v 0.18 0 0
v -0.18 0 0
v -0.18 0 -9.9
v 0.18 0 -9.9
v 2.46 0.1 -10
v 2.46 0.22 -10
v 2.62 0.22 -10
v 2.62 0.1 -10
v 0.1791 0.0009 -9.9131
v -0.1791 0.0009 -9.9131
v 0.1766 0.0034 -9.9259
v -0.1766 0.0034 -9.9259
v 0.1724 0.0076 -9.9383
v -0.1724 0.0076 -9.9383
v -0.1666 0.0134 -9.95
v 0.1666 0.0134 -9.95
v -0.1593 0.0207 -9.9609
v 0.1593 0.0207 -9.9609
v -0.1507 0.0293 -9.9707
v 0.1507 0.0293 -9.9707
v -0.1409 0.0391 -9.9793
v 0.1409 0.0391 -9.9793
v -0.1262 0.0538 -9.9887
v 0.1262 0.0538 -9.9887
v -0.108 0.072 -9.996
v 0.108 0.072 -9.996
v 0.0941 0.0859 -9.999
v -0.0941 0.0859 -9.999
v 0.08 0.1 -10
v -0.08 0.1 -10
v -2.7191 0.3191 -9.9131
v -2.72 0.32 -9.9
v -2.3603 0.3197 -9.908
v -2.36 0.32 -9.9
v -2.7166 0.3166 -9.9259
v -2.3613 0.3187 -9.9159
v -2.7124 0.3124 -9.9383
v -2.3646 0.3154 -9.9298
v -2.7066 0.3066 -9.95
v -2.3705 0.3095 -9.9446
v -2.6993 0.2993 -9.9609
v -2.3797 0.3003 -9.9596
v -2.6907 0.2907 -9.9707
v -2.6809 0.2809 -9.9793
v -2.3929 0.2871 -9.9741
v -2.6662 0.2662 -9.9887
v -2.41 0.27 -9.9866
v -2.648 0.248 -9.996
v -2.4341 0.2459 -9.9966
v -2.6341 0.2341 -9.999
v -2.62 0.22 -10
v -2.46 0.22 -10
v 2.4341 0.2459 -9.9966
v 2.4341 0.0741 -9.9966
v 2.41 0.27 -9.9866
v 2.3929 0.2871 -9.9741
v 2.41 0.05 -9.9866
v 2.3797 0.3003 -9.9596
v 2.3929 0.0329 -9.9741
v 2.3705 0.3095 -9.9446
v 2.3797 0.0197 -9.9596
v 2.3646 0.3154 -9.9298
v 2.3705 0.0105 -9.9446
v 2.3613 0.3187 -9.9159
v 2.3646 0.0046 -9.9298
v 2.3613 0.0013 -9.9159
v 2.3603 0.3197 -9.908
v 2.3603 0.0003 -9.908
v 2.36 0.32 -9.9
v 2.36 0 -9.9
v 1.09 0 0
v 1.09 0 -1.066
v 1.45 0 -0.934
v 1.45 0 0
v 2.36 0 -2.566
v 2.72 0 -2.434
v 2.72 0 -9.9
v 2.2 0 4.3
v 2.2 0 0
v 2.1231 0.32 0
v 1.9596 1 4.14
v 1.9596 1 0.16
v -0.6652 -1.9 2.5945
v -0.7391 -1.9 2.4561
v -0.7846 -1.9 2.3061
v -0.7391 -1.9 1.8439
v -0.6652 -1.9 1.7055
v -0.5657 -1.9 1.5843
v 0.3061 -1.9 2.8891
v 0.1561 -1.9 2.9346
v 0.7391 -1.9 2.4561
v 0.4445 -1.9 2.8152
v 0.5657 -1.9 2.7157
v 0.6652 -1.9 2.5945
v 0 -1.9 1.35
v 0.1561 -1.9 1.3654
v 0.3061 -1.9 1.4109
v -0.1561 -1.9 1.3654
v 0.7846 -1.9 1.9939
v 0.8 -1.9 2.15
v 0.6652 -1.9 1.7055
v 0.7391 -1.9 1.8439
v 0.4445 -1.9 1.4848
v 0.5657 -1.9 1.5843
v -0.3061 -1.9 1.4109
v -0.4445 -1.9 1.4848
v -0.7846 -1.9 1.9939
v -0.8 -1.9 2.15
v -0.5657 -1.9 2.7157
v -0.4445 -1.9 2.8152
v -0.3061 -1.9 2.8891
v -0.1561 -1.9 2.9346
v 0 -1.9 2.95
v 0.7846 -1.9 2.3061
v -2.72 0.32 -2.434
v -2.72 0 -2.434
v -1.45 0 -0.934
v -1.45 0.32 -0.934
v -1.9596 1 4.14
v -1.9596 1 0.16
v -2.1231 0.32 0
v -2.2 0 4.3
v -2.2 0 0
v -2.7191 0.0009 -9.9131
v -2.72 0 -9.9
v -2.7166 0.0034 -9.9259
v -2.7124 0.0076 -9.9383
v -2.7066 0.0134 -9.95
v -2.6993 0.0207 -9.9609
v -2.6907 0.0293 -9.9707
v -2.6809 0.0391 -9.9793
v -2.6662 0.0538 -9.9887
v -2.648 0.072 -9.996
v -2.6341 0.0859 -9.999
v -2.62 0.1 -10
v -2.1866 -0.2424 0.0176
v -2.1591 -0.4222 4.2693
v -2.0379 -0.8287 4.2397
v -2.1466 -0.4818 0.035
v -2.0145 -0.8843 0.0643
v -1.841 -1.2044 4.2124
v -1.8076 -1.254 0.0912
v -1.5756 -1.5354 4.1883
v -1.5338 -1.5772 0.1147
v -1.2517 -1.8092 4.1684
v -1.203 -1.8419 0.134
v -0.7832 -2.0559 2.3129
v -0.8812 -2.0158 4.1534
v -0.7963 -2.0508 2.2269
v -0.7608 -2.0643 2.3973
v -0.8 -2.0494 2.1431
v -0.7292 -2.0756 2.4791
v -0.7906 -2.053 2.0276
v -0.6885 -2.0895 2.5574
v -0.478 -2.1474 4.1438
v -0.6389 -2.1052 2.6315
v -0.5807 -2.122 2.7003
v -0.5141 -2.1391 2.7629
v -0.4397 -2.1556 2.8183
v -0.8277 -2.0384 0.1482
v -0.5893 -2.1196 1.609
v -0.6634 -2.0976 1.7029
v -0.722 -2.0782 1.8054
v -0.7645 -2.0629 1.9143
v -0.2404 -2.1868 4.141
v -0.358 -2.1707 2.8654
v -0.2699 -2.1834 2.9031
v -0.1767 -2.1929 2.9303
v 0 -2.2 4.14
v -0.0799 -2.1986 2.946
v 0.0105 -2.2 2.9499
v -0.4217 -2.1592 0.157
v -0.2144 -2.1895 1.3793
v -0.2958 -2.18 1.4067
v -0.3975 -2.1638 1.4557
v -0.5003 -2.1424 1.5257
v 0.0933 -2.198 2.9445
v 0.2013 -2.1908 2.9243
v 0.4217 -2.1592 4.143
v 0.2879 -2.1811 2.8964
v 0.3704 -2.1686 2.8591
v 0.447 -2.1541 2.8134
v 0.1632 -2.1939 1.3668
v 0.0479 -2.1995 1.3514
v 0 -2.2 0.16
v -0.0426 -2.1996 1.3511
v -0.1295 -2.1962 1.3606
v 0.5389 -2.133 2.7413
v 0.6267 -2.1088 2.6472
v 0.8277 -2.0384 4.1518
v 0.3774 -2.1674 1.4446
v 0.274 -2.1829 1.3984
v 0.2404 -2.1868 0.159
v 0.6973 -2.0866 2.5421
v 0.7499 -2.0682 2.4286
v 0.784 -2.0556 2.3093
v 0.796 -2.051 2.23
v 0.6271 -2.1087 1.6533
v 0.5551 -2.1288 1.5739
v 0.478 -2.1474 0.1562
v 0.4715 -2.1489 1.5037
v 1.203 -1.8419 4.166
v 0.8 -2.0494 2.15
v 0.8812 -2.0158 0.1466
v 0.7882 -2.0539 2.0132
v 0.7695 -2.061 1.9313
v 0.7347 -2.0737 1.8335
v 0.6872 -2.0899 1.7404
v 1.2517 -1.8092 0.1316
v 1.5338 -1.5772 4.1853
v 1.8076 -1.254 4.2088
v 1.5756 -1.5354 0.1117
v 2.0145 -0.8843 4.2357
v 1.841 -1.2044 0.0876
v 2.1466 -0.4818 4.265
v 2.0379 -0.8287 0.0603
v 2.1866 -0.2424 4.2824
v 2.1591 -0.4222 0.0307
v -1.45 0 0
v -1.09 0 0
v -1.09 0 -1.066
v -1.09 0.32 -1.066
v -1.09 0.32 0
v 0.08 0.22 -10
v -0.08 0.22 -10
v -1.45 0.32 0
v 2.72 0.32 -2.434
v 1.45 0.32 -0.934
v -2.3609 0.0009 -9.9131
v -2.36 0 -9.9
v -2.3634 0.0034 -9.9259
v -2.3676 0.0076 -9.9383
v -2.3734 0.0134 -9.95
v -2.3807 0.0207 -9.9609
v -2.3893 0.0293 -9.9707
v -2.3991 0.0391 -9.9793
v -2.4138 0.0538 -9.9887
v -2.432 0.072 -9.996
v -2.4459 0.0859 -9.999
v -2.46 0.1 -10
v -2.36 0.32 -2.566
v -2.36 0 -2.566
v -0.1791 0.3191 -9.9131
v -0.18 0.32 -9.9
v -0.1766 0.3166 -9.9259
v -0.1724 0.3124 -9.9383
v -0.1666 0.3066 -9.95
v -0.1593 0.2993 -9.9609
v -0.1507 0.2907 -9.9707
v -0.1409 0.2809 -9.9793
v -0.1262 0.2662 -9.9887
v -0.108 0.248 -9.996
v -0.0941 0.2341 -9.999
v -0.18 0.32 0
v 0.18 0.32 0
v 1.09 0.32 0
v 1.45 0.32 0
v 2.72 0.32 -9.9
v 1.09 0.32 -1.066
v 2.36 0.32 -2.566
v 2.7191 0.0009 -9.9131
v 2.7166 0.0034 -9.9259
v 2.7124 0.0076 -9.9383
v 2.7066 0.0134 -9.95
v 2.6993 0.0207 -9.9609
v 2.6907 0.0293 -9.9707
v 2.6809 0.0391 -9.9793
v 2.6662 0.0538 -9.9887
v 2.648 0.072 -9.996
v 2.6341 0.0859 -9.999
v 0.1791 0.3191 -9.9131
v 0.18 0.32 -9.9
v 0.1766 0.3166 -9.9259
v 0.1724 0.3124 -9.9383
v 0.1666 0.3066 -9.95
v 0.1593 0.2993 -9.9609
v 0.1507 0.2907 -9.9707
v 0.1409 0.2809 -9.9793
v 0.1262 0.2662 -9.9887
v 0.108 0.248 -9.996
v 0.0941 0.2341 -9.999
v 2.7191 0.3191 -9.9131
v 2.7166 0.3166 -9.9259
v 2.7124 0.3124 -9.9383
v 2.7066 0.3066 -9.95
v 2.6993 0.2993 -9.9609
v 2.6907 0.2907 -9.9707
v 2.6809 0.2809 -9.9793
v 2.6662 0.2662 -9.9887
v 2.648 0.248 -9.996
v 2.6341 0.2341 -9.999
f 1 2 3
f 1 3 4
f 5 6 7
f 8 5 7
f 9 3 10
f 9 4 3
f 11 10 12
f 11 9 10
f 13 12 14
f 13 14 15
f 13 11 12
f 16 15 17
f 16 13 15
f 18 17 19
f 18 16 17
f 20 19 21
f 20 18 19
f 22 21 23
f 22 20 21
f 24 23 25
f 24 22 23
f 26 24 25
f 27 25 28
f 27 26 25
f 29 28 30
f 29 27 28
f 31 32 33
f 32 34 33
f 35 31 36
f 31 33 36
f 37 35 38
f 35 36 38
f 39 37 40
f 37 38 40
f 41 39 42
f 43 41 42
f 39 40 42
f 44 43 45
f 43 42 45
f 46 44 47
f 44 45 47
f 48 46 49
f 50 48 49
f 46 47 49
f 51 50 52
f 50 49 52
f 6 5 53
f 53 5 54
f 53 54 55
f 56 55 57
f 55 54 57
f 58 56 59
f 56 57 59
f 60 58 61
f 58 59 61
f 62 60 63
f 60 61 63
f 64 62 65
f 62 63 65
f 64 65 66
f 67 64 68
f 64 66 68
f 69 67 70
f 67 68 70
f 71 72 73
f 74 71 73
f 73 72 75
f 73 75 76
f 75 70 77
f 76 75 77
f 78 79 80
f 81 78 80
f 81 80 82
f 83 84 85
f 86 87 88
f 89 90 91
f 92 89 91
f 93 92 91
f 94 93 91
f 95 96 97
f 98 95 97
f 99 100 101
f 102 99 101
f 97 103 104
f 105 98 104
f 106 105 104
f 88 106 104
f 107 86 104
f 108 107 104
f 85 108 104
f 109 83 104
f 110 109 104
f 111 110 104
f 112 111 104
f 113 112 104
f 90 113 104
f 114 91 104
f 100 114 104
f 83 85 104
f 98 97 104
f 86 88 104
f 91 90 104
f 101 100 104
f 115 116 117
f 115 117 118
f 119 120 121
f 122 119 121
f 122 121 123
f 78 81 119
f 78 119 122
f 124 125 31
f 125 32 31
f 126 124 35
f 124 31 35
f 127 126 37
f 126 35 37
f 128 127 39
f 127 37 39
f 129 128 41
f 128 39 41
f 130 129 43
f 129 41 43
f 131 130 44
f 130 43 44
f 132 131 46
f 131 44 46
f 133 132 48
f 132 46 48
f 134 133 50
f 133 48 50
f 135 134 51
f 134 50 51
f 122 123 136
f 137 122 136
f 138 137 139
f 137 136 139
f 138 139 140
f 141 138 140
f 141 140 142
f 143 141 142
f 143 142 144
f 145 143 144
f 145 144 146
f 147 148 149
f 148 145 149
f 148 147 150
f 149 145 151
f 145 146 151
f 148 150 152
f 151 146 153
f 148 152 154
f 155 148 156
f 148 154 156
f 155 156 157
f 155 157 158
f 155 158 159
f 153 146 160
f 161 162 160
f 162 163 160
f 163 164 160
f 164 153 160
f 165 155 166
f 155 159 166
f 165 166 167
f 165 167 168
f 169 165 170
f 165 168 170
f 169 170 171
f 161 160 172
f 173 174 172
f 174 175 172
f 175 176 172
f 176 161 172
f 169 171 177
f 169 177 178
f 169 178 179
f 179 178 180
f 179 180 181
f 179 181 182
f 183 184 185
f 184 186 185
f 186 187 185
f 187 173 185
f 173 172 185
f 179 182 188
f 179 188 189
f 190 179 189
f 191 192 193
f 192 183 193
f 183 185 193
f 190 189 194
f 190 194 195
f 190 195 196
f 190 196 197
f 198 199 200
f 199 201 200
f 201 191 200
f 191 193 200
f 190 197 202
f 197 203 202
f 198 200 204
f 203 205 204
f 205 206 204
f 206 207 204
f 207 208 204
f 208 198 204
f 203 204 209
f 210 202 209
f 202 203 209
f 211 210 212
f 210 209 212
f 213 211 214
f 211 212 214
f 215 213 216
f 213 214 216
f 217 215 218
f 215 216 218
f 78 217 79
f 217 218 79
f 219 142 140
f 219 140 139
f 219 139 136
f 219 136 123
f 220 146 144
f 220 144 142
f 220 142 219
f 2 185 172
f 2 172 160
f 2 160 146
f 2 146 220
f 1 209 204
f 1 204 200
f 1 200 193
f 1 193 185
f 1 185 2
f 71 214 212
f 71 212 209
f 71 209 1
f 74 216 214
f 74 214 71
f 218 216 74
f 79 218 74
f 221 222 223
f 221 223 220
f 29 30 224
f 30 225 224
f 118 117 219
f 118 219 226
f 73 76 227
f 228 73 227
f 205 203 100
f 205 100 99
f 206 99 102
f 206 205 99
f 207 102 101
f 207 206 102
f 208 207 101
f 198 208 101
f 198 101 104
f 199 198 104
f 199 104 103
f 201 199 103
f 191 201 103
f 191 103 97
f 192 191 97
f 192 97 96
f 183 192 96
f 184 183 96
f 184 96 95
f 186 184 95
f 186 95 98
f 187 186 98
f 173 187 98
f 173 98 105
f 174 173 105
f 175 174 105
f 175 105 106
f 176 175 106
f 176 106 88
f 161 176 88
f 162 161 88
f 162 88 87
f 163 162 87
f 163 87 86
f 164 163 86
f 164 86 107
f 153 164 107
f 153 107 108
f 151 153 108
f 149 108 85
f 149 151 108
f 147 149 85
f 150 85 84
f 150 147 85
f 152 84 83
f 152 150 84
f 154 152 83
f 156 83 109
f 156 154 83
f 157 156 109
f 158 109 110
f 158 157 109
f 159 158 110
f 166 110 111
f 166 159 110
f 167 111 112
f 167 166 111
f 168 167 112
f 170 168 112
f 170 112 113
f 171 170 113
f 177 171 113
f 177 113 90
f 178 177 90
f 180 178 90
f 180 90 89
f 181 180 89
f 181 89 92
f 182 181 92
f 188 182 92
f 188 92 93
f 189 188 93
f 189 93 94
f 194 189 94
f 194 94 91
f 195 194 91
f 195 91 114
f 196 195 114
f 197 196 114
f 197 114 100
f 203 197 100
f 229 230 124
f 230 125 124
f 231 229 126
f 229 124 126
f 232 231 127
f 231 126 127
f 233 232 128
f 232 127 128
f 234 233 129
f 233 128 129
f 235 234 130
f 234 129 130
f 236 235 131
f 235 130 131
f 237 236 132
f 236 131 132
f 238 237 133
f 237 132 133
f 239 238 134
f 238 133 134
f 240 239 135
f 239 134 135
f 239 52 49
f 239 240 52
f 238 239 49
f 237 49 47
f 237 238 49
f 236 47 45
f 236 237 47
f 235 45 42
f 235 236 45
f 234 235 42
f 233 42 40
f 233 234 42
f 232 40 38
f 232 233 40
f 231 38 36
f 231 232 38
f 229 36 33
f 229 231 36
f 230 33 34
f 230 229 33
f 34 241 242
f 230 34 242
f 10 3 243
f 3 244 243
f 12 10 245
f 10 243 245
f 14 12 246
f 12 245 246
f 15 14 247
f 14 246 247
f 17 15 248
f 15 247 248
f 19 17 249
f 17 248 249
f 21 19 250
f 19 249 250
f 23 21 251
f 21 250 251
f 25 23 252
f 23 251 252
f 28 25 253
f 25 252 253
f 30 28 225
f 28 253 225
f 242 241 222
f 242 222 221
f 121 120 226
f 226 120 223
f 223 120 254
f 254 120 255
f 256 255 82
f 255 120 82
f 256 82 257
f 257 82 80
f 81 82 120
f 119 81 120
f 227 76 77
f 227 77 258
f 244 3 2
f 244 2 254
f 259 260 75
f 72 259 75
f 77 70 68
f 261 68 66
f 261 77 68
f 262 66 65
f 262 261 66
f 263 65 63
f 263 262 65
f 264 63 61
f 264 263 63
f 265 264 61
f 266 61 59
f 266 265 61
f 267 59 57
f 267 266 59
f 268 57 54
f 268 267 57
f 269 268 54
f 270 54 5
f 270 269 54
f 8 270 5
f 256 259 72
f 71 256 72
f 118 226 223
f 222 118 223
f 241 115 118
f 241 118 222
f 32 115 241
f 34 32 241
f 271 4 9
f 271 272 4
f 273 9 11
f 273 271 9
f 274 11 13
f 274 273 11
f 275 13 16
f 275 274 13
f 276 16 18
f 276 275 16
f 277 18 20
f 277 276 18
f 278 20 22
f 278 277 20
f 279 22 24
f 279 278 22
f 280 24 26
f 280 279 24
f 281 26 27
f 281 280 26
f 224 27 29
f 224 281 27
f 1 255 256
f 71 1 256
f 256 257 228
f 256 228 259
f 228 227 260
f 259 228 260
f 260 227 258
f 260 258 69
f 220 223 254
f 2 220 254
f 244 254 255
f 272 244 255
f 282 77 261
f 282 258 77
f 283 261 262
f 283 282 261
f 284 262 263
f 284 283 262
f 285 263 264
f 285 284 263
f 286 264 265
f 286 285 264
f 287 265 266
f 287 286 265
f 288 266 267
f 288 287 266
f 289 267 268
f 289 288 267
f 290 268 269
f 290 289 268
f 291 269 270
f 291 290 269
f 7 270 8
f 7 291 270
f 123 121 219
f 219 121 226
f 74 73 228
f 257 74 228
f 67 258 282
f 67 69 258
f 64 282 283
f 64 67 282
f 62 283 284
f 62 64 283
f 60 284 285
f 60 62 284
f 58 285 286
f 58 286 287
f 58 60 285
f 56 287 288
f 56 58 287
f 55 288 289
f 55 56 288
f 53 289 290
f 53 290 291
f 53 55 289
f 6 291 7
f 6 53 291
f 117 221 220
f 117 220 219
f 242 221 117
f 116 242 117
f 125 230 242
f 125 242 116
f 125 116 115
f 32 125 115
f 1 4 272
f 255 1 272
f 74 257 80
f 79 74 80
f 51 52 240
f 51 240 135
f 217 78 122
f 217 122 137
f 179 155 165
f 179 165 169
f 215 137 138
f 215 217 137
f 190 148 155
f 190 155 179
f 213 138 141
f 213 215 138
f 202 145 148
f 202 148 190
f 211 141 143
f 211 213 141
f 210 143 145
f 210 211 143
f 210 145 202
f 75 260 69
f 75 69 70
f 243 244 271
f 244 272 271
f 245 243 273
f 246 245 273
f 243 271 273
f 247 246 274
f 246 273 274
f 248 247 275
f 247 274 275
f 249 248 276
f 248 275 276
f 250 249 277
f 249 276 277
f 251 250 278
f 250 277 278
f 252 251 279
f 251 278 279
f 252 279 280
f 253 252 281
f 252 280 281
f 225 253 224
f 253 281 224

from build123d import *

# Parameters (mm, degrees)
BOSS_EXTRUDE1_DEPTH = 4.3
SKETCH2_W           = 0.36
SKETCH2_H           = 0.32
SKETCH2_4_W         = 0.36
SKETCH2_4_H         = 0.32
BOSS_EXTRUDE2_DEPTH = 10
FILLET1_R           = 0.1
SKETCH4_R           = 0.8
CUT_EXTRUDE1_DEPTH  = 0.25
CUT_EXTRUDE2_DEPTH  = 5
CUT_EXTRUDE3_DEPTH  = 5
CUT_EXTRUDE4_DEPTH  = 5
CUT_EXTRUDE6_DEPTH  = 5
SKETCH4_3_R         = 0.8
CUT_EXTRUDE8_DEPTH  = 0.3


with BuildPart() as part:
    # Sketch1 → Boss-Extrude1 (new body)
    with BuildSketch(Plane.XY):
        with BuildLine():
            Line((-1.959591794, 1), (-2.2, 0))
            ThreePointArc((-2.2, 0), (0, -2.2), (2.2, 0))
            Line((2.2, 0), (1.959591794, 1))
            Line((1.959591794, 1), (-1.959591794, 1))
        make_face()
    extrude(amount=BOSS_EXTRUDE1_DEPTH)

    # Sweep1: sweep along a curve in space
    with BuildLine() as sweep1_path:
        Line((1.27, 0.16, 0), (1.27, 0.16, -1))
        Line((1.27, 0.16, -1), (2.54, 0.16, -2.5))
        Line((2.54, 0.16, -10), (2.54, 0.16, -2.5))
    # Sketch2 → Sweep1 (sweep)
    with BuildSketch(Plane.XY):
        with Locations((1.27, 0.16)):
            Rectangle(SKETCH2_W, SKETCH2_H)
    sweep1 = sweep(path=sweep1_path.line, transition=Transition.RIGHT)

    # Mirror1: Sweep1 across plane
    add(sweep1.mirror(Plane(origin=(0, 0, 0), x_dir=(0, 0, 1), z_dir=(1, 0, 0))))

    # Sketch2<4> → Boss-Extrude2 (add)
    with BuildSketch(Plane.XY):
        with Locations((0, 0.16)):
            Rectangle(SKETCH2_4_W, SKETCH2_4_H)
    extrude(amount=-BOSS_EXTRUDE2_DEPTH)

    # Fillet1
    fillet1_edges = [part.edges().sort_by_distance(p)[0] for p in [
        (-2.54, 0.32, -10),
        (-2.72, 0.16, -10),
        (-2.54, 0, -10),
        (-2.36, 0.16, -10),
        (0, 0.32, -10),
        (-0.18, 0.16, -10),
        (0, 0, -10),
        (0.18, 0.16, -10),
        (2.36, 0.16, -10),
        (2.54, 0.32, -10),
        (2.72, 0.16, -10),
        (2.54, 0, -10),
    ]]
    fillet(fillet1_edges, radius=FILLET1_R)

    # Sketch4 → Cut-Extrude1 (cut)
    with BuildSketch(Plane(origin=(0, -2.2, 0), x_dir=(1, 0, 0), z_dir=(0, 1, 0))):
        with Locations((0, -2.15)):
            Circle(SKETCH4_R)
    extrude(amount=CUT_EXTRUDE1_DEPTH, mode=Mode.SUBTRACT)

    # Sketch5 → Cut-Extrude2 (cut)
    with BuildSketch(Plane(origin=(2.2, 0, 0), x_dir=(0, 0, -1), z_dir=(1, 0, 0))):
        Polygon((-4.3, 1), (-4.3, 0), (-4.14, 1), align=None)
    extrude(amount=-CUT_EXTRUDE2_DEPTH, mode=Mode.SUBTRACT)

    # Sketch6 → Cut-Extrude3 (cut)
    with BuildSketch(Plane(origin=(2.2, 0, 0), x_dir=(0, 0, -1), z_dir=(1, 0, 0))):
        Polygon((-4.3, 0), (-4.14, -2.2), (-4.3, -2.2), align=None)
    extrude(amount=-CUT_EXTRUDE3_DEPTH, mode=Mode.SUBTRACT)

    # Sketch7 → Cut-Extrude4 (cut)
    with BuildSketch(Plane(origin=(2.2, 0, 0), x_dir=(0, 0, -1), z_dir=(1, 0, 0))):
        Polygon((0, 0), (0, -2.2), (-0.16, -2.2), align=None)
    extrude(amount=-CUT_EXTRUDE4_DEPTH, mode=Mode.SUBTRACT)

    # Sketch8 → Cut-Extrude6 (cut)
    with BuildSketch(Plane(origin=(2.2, 0, 0), x_dir=(0, 0, -1), z_dir=(1, 0, 0))):
        Polygon((0, 0.32), (0, 1), (-0.16, 1), align=None)
    extrude(amount=-CUT_EXTRUDE6_DEPTH, mode=Mode.SUBTRACT)

    # Sketch4<3> → Cut-Extrude8 (cut)
    with BuildSketch(Plane(origin=(0, -2.2, 0), x_dir=(1, 0, 0), z_dir=(0, 1, 0))):
        with Locations((0, -2.15)):
            Circle(SKETCH4_3_R)
    extrude(amount=CUT_EXTRUDE8_DEPTH, mode=Mode.SUBTRACT)


solid = part.part
